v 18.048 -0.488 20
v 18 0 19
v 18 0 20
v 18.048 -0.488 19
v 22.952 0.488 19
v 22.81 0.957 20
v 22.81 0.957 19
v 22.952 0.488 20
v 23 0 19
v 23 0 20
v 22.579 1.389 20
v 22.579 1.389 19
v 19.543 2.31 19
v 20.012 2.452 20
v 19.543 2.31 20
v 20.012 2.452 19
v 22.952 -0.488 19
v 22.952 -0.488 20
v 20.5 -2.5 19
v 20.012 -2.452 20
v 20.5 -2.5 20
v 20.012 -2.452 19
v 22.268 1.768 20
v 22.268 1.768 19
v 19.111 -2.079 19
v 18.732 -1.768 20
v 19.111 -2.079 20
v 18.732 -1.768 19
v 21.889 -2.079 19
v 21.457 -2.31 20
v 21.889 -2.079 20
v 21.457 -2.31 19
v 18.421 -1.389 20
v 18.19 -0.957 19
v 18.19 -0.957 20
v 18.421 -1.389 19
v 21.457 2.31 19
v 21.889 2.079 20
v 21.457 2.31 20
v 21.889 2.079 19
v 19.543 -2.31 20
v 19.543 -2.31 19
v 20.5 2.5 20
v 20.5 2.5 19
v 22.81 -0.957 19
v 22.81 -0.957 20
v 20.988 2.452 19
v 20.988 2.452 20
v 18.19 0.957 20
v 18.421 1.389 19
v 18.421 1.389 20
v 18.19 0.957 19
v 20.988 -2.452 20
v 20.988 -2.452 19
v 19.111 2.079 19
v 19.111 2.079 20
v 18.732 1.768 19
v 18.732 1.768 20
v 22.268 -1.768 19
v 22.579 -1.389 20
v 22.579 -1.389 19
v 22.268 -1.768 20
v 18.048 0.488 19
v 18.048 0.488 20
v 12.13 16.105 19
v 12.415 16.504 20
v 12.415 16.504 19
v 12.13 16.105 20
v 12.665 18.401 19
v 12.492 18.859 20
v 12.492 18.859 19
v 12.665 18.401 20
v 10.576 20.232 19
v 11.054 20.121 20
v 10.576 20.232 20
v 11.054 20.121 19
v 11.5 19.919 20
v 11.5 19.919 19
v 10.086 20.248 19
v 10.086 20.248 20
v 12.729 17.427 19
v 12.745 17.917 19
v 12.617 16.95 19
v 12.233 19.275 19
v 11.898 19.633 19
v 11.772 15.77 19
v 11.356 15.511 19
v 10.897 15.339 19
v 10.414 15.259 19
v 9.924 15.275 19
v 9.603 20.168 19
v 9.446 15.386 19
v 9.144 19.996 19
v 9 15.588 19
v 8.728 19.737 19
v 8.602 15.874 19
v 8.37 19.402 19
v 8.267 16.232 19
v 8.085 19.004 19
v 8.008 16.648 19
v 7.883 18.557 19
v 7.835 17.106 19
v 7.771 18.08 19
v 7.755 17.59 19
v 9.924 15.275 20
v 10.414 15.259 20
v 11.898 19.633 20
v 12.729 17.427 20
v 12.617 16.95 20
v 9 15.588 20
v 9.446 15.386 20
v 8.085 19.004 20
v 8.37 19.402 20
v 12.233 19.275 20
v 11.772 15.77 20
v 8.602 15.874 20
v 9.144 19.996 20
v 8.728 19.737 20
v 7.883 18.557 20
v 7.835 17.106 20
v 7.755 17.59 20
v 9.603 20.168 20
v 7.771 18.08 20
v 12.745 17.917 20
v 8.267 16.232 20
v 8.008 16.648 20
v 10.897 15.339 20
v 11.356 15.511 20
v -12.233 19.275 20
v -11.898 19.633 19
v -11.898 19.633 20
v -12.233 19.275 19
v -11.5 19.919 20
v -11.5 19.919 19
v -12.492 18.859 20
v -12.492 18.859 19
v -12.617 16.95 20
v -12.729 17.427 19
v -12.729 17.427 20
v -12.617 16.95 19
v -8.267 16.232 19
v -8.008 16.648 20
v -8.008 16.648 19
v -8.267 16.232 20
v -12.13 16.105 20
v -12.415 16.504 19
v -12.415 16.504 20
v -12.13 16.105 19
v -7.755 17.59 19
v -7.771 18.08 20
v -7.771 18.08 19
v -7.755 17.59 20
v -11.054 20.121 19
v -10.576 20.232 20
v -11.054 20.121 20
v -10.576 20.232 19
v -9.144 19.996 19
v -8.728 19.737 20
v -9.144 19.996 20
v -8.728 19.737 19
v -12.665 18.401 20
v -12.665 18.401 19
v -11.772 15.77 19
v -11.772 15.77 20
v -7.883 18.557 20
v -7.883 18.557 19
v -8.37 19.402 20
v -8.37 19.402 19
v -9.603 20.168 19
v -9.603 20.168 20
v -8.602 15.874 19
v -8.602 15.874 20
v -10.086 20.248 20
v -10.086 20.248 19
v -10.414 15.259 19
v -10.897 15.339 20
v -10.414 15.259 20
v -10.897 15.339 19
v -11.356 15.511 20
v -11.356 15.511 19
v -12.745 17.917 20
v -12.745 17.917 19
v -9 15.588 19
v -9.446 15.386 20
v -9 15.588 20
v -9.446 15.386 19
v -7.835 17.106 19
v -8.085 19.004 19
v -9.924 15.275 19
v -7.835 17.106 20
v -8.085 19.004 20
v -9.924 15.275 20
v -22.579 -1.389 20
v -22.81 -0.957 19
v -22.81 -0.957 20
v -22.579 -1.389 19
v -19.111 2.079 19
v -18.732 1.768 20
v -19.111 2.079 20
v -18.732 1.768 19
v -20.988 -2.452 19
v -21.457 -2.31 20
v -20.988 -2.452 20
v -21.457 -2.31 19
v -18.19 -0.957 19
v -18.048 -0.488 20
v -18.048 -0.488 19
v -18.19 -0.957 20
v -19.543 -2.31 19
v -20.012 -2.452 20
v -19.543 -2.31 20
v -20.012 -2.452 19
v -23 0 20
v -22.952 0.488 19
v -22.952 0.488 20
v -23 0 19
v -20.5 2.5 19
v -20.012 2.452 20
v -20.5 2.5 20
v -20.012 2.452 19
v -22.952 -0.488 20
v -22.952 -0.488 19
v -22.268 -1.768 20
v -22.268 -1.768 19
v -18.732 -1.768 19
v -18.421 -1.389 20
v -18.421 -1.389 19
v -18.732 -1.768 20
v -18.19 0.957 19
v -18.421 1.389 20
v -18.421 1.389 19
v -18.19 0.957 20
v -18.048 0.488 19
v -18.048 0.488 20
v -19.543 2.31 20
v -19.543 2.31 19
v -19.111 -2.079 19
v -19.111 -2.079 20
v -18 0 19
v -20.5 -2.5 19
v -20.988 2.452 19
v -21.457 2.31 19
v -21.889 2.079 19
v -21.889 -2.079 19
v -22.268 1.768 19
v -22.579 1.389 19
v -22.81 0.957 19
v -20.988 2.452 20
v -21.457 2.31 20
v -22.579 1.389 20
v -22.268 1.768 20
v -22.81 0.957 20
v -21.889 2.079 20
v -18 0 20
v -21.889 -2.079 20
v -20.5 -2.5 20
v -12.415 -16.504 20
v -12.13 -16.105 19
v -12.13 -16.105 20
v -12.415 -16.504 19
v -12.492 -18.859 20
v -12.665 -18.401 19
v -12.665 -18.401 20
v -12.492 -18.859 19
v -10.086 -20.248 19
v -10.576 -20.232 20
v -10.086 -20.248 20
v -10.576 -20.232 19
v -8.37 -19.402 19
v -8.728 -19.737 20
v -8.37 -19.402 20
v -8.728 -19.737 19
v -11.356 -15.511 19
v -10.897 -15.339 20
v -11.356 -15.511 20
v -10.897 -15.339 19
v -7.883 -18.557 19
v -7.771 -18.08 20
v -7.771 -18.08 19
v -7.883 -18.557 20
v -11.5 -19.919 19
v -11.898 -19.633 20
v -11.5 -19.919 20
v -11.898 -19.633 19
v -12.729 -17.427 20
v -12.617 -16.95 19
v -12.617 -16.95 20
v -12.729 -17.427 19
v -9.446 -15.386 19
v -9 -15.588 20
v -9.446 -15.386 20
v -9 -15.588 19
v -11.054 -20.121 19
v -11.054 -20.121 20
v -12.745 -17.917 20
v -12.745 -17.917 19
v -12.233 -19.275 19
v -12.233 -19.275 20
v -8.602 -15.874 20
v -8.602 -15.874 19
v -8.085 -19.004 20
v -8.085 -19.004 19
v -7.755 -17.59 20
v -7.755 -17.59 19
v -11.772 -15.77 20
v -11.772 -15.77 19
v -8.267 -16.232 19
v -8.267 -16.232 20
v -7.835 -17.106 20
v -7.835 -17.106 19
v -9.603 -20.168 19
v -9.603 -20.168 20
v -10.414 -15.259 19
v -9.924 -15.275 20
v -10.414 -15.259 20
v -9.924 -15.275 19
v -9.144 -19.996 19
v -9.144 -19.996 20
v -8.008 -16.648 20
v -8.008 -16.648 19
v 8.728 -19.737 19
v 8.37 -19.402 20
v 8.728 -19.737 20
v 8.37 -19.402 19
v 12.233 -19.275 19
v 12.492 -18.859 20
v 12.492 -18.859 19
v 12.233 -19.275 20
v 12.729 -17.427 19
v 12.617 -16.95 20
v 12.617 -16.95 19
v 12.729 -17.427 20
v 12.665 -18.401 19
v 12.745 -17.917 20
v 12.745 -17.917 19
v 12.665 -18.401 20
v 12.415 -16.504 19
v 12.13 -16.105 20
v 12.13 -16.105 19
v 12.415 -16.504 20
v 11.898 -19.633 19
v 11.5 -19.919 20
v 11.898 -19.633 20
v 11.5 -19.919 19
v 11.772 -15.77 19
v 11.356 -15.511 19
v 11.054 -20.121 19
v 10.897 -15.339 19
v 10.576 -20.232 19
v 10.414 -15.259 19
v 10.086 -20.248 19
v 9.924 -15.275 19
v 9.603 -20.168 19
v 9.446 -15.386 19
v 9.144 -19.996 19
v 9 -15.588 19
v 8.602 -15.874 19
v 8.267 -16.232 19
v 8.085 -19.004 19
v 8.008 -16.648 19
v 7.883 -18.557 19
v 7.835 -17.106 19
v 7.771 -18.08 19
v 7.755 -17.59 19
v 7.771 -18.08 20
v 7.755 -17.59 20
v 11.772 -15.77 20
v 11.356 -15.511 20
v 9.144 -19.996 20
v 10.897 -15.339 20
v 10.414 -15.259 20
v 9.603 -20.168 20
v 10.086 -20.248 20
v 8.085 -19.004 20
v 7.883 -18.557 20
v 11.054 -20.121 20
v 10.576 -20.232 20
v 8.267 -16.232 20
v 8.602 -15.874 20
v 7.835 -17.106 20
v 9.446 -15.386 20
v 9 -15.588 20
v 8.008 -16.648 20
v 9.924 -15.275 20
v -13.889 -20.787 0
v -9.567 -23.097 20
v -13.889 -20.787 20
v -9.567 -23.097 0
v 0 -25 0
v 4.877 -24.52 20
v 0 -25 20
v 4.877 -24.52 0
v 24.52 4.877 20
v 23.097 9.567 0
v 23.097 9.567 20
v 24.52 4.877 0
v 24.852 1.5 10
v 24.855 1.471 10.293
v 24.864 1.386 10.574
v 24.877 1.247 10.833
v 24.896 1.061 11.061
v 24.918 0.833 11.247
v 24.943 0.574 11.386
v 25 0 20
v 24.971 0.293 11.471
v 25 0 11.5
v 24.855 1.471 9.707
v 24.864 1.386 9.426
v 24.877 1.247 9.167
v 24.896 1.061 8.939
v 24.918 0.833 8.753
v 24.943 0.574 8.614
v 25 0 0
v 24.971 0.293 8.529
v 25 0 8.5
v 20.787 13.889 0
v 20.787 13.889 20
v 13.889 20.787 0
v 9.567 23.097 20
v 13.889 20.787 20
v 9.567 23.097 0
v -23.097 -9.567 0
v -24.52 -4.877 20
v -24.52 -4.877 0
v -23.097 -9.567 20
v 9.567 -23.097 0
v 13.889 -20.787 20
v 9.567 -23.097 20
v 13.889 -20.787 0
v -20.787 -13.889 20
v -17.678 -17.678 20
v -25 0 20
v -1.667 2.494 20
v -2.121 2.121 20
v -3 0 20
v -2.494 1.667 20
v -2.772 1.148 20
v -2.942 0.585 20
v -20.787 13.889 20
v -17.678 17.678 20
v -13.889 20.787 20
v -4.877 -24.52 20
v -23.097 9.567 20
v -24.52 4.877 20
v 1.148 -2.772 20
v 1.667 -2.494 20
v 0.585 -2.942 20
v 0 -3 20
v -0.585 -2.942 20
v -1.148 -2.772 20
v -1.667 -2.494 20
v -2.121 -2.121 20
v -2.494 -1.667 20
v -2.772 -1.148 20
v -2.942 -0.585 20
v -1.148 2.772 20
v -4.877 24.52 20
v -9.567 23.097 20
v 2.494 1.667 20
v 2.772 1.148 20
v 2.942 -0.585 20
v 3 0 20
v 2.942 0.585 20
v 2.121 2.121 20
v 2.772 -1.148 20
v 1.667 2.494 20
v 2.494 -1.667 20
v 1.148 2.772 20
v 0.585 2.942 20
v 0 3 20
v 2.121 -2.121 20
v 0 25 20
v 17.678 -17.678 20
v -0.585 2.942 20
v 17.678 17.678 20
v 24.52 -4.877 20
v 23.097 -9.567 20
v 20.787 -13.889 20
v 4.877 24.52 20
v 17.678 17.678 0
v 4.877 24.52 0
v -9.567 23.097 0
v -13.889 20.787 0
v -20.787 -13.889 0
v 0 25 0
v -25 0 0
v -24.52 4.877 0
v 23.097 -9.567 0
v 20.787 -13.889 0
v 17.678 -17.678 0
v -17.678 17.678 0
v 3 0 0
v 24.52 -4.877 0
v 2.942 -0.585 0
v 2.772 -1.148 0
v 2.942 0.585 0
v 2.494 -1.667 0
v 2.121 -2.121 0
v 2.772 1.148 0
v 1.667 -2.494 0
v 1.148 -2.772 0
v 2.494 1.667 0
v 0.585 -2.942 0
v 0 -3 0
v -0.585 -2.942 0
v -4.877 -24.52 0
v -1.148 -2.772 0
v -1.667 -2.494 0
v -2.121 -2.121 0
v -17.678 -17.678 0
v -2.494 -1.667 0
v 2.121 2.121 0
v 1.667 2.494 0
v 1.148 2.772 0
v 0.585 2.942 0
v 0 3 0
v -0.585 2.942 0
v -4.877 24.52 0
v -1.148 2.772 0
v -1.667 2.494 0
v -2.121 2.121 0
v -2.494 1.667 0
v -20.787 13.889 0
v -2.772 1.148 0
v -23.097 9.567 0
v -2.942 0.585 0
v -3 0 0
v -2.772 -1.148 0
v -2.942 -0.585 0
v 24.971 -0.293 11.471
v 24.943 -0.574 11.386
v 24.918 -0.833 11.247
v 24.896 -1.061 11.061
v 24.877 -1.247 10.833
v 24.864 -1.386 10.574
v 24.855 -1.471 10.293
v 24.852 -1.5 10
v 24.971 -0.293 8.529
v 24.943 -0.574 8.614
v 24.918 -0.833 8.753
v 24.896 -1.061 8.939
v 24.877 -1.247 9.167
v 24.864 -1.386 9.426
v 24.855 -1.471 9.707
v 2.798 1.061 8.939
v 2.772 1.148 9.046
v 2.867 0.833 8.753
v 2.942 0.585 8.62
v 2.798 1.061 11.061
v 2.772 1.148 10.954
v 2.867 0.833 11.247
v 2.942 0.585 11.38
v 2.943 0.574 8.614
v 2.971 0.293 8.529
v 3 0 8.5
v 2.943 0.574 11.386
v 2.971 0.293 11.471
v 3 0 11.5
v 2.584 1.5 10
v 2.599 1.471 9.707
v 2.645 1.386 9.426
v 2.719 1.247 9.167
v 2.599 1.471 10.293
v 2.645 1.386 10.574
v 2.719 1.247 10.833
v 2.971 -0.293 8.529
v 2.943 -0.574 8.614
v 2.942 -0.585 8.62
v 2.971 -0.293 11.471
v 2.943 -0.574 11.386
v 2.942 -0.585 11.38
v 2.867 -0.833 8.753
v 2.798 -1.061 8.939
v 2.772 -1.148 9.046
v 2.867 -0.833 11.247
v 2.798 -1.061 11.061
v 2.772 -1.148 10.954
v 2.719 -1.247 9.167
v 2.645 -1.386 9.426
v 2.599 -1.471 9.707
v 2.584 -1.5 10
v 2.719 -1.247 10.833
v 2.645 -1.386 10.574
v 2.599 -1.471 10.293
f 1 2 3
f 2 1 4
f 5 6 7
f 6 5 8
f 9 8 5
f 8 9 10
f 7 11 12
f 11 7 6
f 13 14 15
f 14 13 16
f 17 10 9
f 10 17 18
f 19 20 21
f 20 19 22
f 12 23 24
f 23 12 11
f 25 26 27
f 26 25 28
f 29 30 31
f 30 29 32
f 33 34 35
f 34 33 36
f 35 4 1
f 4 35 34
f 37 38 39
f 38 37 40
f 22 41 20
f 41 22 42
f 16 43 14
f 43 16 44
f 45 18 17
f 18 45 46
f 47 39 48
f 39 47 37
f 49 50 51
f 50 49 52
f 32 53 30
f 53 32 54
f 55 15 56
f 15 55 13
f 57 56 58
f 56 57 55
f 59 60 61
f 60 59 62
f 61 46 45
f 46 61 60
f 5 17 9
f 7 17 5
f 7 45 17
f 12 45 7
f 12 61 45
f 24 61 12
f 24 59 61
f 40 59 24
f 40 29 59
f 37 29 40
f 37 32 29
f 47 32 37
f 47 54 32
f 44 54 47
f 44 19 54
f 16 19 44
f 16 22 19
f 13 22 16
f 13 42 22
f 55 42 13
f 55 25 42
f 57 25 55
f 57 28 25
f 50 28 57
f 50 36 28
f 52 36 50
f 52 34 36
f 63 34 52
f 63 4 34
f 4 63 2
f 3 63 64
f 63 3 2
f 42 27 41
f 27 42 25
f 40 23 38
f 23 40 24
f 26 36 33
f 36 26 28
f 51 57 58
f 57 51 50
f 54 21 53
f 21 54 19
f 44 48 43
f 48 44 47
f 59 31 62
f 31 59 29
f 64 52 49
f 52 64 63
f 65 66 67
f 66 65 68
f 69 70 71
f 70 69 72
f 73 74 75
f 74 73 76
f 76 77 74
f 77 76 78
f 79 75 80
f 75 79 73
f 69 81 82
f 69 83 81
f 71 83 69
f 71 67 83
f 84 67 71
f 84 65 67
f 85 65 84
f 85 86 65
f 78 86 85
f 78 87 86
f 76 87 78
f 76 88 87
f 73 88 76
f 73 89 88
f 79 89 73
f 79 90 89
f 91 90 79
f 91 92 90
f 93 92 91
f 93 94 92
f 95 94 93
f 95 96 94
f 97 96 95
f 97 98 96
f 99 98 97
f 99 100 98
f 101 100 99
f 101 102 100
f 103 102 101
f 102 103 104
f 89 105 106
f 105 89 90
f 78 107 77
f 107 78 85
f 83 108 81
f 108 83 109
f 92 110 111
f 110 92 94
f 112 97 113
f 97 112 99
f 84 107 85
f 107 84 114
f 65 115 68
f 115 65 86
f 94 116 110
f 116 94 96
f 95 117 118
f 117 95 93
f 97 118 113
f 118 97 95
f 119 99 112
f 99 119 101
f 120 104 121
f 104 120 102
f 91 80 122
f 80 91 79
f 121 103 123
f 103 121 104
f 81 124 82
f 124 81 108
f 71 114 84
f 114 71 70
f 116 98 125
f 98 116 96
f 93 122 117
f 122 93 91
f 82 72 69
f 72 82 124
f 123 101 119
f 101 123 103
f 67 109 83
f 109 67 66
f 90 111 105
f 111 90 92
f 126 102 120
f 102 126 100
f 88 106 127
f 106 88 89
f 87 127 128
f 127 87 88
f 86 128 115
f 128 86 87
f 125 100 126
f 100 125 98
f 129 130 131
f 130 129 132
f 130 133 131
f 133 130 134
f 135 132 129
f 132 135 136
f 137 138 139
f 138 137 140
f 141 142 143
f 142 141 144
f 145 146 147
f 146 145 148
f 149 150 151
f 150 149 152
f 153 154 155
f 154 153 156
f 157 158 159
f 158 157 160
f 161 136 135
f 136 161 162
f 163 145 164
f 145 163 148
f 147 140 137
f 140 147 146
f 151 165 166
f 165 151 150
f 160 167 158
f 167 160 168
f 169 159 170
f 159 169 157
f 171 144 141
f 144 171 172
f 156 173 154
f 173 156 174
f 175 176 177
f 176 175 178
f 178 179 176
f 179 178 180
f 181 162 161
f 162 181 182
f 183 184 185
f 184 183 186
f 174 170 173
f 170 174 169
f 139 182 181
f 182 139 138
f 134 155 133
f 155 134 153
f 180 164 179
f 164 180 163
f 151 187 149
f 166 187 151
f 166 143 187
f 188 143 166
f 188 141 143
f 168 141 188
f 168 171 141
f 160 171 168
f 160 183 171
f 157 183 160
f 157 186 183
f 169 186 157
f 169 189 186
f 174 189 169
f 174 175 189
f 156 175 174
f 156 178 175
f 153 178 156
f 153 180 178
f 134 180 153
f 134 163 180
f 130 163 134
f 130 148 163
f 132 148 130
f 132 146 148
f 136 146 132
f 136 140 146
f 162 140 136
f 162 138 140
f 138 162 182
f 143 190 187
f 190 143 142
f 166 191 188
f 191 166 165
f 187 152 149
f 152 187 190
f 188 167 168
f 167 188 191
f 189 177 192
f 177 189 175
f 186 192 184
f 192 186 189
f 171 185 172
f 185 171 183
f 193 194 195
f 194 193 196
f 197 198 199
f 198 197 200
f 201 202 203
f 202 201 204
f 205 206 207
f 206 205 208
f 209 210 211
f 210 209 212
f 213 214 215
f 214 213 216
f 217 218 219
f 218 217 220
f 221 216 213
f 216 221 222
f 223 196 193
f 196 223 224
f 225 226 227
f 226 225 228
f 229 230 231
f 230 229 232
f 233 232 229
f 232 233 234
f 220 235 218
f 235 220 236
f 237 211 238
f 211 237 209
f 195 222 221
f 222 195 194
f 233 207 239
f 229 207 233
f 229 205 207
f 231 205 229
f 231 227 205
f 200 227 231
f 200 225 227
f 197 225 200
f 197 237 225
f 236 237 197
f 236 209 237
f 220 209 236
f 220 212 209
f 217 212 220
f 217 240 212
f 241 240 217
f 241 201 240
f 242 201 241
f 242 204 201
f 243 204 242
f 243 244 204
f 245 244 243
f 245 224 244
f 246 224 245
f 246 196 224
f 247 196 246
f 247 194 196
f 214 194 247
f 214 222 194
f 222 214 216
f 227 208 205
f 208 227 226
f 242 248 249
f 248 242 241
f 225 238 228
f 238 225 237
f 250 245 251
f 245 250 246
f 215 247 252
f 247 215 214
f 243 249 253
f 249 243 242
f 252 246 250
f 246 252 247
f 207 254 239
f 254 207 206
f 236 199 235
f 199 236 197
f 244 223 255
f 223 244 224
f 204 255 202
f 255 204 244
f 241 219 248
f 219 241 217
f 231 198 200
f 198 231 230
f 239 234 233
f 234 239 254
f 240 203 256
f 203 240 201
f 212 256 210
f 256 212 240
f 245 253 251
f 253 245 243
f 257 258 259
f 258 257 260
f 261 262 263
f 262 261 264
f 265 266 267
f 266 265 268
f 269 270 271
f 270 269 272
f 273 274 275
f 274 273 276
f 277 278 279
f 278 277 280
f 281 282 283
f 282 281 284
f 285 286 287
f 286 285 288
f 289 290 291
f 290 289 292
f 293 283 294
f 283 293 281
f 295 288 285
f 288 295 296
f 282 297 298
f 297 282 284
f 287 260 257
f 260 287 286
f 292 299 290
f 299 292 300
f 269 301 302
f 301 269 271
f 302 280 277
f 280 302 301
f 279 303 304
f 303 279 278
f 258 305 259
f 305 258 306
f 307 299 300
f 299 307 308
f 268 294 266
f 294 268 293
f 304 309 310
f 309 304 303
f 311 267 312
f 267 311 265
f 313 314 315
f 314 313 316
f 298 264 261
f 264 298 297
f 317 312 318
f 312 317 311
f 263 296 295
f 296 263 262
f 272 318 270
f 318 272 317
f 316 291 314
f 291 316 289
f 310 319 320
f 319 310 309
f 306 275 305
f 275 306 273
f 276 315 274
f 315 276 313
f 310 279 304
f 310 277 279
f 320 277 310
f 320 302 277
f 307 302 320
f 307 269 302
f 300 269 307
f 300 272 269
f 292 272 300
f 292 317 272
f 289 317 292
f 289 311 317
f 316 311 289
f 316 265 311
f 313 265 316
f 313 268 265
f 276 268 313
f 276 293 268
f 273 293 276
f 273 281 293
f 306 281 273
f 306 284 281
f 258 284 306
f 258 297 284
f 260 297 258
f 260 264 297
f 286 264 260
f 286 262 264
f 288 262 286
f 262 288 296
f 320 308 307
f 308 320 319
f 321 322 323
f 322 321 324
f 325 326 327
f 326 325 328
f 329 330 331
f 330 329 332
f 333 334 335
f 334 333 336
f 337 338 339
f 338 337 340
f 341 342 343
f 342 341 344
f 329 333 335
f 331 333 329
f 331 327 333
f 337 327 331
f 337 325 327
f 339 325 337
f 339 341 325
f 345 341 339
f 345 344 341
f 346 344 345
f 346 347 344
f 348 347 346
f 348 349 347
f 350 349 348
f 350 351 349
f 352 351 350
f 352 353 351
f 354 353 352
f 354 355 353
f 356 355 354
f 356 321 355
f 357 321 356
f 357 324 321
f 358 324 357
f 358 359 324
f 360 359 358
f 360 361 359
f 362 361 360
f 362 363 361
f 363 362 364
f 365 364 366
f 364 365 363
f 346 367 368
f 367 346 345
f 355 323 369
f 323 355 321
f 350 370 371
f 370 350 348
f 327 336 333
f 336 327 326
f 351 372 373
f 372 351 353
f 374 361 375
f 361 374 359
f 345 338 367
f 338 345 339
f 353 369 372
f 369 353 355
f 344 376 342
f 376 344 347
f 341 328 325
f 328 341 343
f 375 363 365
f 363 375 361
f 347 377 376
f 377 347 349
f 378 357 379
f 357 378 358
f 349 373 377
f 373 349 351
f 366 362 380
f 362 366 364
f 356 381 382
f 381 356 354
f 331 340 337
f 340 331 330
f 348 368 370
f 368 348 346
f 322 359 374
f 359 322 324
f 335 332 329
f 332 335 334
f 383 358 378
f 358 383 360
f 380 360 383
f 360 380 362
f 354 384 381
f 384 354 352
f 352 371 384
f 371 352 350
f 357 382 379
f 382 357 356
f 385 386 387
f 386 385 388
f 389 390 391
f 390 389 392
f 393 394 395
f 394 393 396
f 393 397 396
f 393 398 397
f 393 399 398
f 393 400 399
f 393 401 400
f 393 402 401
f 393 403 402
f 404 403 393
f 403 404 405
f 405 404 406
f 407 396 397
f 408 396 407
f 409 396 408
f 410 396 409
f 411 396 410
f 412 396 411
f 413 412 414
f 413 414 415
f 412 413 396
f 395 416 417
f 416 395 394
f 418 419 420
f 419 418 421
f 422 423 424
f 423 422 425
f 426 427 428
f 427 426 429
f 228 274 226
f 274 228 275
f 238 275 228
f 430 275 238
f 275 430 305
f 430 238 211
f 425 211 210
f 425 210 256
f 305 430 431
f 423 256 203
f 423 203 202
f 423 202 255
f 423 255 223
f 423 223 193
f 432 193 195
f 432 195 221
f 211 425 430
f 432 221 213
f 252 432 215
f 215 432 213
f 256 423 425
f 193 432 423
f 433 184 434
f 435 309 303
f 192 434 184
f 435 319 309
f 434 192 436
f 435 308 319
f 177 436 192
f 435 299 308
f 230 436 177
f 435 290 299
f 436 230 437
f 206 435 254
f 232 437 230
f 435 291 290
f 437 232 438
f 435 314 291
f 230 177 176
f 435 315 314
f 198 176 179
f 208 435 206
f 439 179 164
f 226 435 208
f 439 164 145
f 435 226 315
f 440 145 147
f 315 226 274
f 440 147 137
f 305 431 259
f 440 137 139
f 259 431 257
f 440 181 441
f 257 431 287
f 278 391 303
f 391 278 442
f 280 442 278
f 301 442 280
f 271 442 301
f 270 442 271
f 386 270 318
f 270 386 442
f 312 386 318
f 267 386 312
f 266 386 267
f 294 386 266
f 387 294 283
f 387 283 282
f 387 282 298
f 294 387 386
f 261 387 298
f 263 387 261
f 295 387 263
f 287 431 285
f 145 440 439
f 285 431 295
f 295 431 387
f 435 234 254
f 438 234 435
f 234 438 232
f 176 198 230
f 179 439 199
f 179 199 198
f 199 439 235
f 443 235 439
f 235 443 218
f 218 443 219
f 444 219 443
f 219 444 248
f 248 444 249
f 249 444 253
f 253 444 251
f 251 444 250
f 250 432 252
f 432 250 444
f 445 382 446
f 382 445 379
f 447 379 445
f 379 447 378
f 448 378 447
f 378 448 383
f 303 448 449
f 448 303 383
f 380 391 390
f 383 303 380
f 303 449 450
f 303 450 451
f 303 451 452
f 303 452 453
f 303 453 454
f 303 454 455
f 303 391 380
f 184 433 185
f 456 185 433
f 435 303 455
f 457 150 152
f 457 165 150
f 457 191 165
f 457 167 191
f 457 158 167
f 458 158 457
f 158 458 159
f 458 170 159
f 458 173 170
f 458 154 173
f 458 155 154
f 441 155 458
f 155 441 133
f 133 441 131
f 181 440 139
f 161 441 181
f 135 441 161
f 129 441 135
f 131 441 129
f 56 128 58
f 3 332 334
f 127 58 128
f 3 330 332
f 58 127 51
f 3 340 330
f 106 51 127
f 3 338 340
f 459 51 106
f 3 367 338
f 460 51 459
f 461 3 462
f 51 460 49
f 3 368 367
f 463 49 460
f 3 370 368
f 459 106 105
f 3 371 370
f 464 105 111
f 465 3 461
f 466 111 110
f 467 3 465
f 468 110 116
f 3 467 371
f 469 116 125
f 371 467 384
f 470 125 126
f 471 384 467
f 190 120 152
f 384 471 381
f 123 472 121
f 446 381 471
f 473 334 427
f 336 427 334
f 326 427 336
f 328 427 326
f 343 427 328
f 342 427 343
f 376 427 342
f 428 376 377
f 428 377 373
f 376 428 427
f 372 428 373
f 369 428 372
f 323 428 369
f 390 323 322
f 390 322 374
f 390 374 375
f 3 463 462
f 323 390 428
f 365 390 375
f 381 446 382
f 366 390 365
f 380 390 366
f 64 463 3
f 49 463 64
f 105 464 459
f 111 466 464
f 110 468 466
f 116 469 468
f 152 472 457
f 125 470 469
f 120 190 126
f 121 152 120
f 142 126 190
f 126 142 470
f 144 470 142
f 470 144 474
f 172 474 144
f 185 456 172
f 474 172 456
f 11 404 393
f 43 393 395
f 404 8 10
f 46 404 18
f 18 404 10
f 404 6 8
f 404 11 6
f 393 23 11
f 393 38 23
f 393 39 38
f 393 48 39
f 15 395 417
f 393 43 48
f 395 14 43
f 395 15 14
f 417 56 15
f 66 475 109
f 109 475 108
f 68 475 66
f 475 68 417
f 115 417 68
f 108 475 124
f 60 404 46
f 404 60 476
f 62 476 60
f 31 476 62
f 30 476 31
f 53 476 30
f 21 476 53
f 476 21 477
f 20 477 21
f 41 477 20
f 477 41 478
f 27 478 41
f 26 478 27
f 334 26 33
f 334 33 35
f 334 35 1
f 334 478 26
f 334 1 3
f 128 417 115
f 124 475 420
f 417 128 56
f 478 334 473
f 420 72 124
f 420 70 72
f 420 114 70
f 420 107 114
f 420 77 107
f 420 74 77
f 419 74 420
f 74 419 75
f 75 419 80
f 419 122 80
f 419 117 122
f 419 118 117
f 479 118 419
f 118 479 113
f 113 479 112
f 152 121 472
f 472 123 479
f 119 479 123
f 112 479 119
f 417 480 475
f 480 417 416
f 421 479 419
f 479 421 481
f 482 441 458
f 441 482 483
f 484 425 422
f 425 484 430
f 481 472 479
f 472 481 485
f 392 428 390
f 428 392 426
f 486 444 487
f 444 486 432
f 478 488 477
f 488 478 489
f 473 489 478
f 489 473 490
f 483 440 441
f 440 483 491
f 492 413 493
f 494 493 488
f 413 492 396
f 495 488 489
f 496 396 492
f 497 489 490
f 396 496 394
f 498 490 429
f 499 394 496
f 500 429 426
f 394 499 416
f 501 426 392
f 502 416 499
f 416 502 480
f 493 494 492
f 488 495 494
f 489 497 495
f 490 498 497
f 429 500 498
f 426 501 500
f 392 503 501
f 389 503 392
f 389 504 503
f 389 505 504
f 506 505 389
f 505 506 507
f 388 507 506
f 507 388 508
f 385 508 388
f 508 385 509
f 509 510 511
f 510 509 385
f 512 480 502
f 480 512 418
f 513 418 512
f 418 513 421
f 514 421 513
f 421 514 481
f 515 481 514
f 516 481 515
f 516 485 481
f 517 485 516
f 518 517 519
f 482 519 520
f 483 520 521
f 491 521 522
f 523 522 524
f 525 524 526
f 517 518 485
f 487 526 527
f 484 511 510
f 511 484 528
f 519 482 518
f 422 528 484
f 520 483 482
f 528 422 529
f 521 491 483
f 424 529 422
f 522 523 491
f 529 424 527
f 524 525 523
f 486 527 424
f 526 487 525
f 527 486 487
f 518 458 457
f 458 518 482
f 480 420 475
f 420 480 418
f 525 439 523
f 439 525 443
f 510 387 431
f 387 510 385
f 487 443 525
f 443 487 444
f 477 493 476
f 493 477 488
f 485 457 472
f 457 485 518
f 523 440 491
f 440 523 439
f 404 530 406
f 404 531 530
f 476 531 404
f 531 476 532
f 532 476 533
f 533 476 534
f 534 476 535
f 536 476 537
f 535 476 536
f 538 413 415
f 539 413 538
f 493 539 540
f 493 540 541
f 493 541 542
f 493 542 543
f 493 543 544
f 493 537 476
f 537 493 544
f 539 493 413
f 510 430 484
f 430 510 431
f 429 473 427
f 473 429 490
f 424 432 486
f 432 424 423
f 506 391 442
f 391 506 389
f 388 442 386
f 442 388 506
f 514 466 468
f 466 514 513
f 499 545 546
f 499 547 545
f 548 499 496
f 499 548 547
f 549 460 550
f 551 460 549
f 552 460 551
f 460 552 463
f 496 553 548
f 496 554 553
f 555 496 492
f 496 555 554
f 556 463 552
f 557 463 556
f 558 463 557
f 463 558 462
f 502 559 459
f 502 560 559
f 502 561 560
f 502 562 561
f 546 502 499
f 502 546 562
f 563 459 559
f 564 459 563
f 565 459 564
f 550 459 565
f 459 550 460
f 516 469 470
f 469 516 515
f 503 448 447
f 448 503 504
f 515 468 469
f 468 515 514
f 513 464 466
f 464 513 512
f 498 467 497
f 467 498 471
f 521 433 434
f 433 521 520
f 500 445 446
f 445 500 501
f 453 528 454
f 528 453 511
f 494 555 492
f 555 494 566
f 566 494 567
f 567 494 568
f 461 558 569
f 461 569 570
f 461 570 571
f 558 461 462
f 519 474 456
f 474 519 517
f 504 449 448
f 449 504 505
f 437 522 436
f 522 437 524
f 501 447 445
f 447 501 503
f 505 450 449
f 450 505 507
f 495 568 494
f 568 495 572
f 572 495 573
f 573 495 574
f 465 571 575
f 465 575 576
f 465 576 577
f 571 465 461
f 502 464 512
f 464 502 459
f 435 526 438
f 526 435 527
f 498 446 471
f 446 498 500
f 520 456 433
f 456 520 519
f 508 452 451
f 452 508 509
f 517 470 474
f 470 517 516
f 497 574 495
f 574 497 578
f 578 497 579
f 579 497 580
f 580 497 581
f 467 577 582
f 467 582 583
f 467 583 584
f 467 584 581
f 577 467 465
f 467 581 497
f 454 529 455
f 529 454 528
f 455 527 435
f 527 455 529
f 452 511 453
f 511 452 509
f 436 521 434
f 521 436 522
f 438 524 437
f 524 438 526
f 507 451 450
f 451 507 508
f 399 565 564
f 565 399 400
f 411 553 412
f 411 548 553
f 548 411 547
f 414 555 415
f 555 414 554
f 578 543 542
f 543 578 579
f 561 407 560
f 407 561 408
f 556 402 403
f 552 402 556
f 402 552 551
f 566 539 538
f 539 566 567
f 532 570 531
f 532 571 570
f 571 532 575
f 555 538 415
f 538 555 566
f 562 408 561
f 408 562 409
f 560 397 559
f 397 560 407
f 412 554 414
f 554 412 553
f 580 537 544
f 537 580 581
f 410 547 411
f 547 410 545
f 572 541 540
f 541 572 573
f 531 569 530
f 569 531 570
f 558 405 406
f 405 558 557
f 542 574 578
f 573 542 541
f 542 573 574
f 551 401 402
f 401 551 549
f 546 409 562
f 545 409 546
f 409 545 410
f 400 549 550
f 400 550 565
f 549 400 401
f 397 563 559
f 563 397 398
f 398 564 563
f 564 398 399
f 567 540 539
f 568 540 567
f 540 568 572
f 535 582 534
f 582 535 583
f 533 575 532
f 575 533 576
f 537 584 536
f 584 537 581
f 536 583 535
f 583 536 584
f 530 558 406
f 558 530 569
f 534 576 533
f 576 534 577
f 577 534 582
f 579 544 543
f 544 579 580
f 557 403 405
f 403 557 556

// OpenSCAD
$fn = 32;

// ----------------------------------------------------------------------
// Control knob: dimpled knob
// ----------------------------------------------------------------------

// --- parameters (mm) ---
dimp_d = 5;               // finger dimple diameter
n_dimp = 6;               // number of dimples
dimp_r = 20.5;            // dimple ring radius
knob_d = 50;              // knob body diameter
knob_h = 20;              // knob body height
bore_d = 6;               // shaft bore diameter
set_d = 3;                // set screw bore diameter
fit_tol = 0.1;            // tolerance for press fits, mm
free_tol = 0.5;           // tolerance for clearance fits, mm

dimp_step = 360 / n_dimp;  // dimple angular step

difference() {
  cylinder(h = knob_h, d = knob_d);
  translate([0, 0, -1]) cylinder(h = knob_h + 2, d = bore_d);
  translate([-1, 0, knob_h / 2]) rotate([0, 90, 0])
    cylinder(h = knob_d / 2 + bore_d / 2 + 2, d = set_d);  for (i = [0 : n_dimp - 1])
    rotate([0, 0, i * dimp_step])
      translate([dimp_r, 0, knob_h - 1])
        cylinder(h = 2, d = dimp_d);
}
